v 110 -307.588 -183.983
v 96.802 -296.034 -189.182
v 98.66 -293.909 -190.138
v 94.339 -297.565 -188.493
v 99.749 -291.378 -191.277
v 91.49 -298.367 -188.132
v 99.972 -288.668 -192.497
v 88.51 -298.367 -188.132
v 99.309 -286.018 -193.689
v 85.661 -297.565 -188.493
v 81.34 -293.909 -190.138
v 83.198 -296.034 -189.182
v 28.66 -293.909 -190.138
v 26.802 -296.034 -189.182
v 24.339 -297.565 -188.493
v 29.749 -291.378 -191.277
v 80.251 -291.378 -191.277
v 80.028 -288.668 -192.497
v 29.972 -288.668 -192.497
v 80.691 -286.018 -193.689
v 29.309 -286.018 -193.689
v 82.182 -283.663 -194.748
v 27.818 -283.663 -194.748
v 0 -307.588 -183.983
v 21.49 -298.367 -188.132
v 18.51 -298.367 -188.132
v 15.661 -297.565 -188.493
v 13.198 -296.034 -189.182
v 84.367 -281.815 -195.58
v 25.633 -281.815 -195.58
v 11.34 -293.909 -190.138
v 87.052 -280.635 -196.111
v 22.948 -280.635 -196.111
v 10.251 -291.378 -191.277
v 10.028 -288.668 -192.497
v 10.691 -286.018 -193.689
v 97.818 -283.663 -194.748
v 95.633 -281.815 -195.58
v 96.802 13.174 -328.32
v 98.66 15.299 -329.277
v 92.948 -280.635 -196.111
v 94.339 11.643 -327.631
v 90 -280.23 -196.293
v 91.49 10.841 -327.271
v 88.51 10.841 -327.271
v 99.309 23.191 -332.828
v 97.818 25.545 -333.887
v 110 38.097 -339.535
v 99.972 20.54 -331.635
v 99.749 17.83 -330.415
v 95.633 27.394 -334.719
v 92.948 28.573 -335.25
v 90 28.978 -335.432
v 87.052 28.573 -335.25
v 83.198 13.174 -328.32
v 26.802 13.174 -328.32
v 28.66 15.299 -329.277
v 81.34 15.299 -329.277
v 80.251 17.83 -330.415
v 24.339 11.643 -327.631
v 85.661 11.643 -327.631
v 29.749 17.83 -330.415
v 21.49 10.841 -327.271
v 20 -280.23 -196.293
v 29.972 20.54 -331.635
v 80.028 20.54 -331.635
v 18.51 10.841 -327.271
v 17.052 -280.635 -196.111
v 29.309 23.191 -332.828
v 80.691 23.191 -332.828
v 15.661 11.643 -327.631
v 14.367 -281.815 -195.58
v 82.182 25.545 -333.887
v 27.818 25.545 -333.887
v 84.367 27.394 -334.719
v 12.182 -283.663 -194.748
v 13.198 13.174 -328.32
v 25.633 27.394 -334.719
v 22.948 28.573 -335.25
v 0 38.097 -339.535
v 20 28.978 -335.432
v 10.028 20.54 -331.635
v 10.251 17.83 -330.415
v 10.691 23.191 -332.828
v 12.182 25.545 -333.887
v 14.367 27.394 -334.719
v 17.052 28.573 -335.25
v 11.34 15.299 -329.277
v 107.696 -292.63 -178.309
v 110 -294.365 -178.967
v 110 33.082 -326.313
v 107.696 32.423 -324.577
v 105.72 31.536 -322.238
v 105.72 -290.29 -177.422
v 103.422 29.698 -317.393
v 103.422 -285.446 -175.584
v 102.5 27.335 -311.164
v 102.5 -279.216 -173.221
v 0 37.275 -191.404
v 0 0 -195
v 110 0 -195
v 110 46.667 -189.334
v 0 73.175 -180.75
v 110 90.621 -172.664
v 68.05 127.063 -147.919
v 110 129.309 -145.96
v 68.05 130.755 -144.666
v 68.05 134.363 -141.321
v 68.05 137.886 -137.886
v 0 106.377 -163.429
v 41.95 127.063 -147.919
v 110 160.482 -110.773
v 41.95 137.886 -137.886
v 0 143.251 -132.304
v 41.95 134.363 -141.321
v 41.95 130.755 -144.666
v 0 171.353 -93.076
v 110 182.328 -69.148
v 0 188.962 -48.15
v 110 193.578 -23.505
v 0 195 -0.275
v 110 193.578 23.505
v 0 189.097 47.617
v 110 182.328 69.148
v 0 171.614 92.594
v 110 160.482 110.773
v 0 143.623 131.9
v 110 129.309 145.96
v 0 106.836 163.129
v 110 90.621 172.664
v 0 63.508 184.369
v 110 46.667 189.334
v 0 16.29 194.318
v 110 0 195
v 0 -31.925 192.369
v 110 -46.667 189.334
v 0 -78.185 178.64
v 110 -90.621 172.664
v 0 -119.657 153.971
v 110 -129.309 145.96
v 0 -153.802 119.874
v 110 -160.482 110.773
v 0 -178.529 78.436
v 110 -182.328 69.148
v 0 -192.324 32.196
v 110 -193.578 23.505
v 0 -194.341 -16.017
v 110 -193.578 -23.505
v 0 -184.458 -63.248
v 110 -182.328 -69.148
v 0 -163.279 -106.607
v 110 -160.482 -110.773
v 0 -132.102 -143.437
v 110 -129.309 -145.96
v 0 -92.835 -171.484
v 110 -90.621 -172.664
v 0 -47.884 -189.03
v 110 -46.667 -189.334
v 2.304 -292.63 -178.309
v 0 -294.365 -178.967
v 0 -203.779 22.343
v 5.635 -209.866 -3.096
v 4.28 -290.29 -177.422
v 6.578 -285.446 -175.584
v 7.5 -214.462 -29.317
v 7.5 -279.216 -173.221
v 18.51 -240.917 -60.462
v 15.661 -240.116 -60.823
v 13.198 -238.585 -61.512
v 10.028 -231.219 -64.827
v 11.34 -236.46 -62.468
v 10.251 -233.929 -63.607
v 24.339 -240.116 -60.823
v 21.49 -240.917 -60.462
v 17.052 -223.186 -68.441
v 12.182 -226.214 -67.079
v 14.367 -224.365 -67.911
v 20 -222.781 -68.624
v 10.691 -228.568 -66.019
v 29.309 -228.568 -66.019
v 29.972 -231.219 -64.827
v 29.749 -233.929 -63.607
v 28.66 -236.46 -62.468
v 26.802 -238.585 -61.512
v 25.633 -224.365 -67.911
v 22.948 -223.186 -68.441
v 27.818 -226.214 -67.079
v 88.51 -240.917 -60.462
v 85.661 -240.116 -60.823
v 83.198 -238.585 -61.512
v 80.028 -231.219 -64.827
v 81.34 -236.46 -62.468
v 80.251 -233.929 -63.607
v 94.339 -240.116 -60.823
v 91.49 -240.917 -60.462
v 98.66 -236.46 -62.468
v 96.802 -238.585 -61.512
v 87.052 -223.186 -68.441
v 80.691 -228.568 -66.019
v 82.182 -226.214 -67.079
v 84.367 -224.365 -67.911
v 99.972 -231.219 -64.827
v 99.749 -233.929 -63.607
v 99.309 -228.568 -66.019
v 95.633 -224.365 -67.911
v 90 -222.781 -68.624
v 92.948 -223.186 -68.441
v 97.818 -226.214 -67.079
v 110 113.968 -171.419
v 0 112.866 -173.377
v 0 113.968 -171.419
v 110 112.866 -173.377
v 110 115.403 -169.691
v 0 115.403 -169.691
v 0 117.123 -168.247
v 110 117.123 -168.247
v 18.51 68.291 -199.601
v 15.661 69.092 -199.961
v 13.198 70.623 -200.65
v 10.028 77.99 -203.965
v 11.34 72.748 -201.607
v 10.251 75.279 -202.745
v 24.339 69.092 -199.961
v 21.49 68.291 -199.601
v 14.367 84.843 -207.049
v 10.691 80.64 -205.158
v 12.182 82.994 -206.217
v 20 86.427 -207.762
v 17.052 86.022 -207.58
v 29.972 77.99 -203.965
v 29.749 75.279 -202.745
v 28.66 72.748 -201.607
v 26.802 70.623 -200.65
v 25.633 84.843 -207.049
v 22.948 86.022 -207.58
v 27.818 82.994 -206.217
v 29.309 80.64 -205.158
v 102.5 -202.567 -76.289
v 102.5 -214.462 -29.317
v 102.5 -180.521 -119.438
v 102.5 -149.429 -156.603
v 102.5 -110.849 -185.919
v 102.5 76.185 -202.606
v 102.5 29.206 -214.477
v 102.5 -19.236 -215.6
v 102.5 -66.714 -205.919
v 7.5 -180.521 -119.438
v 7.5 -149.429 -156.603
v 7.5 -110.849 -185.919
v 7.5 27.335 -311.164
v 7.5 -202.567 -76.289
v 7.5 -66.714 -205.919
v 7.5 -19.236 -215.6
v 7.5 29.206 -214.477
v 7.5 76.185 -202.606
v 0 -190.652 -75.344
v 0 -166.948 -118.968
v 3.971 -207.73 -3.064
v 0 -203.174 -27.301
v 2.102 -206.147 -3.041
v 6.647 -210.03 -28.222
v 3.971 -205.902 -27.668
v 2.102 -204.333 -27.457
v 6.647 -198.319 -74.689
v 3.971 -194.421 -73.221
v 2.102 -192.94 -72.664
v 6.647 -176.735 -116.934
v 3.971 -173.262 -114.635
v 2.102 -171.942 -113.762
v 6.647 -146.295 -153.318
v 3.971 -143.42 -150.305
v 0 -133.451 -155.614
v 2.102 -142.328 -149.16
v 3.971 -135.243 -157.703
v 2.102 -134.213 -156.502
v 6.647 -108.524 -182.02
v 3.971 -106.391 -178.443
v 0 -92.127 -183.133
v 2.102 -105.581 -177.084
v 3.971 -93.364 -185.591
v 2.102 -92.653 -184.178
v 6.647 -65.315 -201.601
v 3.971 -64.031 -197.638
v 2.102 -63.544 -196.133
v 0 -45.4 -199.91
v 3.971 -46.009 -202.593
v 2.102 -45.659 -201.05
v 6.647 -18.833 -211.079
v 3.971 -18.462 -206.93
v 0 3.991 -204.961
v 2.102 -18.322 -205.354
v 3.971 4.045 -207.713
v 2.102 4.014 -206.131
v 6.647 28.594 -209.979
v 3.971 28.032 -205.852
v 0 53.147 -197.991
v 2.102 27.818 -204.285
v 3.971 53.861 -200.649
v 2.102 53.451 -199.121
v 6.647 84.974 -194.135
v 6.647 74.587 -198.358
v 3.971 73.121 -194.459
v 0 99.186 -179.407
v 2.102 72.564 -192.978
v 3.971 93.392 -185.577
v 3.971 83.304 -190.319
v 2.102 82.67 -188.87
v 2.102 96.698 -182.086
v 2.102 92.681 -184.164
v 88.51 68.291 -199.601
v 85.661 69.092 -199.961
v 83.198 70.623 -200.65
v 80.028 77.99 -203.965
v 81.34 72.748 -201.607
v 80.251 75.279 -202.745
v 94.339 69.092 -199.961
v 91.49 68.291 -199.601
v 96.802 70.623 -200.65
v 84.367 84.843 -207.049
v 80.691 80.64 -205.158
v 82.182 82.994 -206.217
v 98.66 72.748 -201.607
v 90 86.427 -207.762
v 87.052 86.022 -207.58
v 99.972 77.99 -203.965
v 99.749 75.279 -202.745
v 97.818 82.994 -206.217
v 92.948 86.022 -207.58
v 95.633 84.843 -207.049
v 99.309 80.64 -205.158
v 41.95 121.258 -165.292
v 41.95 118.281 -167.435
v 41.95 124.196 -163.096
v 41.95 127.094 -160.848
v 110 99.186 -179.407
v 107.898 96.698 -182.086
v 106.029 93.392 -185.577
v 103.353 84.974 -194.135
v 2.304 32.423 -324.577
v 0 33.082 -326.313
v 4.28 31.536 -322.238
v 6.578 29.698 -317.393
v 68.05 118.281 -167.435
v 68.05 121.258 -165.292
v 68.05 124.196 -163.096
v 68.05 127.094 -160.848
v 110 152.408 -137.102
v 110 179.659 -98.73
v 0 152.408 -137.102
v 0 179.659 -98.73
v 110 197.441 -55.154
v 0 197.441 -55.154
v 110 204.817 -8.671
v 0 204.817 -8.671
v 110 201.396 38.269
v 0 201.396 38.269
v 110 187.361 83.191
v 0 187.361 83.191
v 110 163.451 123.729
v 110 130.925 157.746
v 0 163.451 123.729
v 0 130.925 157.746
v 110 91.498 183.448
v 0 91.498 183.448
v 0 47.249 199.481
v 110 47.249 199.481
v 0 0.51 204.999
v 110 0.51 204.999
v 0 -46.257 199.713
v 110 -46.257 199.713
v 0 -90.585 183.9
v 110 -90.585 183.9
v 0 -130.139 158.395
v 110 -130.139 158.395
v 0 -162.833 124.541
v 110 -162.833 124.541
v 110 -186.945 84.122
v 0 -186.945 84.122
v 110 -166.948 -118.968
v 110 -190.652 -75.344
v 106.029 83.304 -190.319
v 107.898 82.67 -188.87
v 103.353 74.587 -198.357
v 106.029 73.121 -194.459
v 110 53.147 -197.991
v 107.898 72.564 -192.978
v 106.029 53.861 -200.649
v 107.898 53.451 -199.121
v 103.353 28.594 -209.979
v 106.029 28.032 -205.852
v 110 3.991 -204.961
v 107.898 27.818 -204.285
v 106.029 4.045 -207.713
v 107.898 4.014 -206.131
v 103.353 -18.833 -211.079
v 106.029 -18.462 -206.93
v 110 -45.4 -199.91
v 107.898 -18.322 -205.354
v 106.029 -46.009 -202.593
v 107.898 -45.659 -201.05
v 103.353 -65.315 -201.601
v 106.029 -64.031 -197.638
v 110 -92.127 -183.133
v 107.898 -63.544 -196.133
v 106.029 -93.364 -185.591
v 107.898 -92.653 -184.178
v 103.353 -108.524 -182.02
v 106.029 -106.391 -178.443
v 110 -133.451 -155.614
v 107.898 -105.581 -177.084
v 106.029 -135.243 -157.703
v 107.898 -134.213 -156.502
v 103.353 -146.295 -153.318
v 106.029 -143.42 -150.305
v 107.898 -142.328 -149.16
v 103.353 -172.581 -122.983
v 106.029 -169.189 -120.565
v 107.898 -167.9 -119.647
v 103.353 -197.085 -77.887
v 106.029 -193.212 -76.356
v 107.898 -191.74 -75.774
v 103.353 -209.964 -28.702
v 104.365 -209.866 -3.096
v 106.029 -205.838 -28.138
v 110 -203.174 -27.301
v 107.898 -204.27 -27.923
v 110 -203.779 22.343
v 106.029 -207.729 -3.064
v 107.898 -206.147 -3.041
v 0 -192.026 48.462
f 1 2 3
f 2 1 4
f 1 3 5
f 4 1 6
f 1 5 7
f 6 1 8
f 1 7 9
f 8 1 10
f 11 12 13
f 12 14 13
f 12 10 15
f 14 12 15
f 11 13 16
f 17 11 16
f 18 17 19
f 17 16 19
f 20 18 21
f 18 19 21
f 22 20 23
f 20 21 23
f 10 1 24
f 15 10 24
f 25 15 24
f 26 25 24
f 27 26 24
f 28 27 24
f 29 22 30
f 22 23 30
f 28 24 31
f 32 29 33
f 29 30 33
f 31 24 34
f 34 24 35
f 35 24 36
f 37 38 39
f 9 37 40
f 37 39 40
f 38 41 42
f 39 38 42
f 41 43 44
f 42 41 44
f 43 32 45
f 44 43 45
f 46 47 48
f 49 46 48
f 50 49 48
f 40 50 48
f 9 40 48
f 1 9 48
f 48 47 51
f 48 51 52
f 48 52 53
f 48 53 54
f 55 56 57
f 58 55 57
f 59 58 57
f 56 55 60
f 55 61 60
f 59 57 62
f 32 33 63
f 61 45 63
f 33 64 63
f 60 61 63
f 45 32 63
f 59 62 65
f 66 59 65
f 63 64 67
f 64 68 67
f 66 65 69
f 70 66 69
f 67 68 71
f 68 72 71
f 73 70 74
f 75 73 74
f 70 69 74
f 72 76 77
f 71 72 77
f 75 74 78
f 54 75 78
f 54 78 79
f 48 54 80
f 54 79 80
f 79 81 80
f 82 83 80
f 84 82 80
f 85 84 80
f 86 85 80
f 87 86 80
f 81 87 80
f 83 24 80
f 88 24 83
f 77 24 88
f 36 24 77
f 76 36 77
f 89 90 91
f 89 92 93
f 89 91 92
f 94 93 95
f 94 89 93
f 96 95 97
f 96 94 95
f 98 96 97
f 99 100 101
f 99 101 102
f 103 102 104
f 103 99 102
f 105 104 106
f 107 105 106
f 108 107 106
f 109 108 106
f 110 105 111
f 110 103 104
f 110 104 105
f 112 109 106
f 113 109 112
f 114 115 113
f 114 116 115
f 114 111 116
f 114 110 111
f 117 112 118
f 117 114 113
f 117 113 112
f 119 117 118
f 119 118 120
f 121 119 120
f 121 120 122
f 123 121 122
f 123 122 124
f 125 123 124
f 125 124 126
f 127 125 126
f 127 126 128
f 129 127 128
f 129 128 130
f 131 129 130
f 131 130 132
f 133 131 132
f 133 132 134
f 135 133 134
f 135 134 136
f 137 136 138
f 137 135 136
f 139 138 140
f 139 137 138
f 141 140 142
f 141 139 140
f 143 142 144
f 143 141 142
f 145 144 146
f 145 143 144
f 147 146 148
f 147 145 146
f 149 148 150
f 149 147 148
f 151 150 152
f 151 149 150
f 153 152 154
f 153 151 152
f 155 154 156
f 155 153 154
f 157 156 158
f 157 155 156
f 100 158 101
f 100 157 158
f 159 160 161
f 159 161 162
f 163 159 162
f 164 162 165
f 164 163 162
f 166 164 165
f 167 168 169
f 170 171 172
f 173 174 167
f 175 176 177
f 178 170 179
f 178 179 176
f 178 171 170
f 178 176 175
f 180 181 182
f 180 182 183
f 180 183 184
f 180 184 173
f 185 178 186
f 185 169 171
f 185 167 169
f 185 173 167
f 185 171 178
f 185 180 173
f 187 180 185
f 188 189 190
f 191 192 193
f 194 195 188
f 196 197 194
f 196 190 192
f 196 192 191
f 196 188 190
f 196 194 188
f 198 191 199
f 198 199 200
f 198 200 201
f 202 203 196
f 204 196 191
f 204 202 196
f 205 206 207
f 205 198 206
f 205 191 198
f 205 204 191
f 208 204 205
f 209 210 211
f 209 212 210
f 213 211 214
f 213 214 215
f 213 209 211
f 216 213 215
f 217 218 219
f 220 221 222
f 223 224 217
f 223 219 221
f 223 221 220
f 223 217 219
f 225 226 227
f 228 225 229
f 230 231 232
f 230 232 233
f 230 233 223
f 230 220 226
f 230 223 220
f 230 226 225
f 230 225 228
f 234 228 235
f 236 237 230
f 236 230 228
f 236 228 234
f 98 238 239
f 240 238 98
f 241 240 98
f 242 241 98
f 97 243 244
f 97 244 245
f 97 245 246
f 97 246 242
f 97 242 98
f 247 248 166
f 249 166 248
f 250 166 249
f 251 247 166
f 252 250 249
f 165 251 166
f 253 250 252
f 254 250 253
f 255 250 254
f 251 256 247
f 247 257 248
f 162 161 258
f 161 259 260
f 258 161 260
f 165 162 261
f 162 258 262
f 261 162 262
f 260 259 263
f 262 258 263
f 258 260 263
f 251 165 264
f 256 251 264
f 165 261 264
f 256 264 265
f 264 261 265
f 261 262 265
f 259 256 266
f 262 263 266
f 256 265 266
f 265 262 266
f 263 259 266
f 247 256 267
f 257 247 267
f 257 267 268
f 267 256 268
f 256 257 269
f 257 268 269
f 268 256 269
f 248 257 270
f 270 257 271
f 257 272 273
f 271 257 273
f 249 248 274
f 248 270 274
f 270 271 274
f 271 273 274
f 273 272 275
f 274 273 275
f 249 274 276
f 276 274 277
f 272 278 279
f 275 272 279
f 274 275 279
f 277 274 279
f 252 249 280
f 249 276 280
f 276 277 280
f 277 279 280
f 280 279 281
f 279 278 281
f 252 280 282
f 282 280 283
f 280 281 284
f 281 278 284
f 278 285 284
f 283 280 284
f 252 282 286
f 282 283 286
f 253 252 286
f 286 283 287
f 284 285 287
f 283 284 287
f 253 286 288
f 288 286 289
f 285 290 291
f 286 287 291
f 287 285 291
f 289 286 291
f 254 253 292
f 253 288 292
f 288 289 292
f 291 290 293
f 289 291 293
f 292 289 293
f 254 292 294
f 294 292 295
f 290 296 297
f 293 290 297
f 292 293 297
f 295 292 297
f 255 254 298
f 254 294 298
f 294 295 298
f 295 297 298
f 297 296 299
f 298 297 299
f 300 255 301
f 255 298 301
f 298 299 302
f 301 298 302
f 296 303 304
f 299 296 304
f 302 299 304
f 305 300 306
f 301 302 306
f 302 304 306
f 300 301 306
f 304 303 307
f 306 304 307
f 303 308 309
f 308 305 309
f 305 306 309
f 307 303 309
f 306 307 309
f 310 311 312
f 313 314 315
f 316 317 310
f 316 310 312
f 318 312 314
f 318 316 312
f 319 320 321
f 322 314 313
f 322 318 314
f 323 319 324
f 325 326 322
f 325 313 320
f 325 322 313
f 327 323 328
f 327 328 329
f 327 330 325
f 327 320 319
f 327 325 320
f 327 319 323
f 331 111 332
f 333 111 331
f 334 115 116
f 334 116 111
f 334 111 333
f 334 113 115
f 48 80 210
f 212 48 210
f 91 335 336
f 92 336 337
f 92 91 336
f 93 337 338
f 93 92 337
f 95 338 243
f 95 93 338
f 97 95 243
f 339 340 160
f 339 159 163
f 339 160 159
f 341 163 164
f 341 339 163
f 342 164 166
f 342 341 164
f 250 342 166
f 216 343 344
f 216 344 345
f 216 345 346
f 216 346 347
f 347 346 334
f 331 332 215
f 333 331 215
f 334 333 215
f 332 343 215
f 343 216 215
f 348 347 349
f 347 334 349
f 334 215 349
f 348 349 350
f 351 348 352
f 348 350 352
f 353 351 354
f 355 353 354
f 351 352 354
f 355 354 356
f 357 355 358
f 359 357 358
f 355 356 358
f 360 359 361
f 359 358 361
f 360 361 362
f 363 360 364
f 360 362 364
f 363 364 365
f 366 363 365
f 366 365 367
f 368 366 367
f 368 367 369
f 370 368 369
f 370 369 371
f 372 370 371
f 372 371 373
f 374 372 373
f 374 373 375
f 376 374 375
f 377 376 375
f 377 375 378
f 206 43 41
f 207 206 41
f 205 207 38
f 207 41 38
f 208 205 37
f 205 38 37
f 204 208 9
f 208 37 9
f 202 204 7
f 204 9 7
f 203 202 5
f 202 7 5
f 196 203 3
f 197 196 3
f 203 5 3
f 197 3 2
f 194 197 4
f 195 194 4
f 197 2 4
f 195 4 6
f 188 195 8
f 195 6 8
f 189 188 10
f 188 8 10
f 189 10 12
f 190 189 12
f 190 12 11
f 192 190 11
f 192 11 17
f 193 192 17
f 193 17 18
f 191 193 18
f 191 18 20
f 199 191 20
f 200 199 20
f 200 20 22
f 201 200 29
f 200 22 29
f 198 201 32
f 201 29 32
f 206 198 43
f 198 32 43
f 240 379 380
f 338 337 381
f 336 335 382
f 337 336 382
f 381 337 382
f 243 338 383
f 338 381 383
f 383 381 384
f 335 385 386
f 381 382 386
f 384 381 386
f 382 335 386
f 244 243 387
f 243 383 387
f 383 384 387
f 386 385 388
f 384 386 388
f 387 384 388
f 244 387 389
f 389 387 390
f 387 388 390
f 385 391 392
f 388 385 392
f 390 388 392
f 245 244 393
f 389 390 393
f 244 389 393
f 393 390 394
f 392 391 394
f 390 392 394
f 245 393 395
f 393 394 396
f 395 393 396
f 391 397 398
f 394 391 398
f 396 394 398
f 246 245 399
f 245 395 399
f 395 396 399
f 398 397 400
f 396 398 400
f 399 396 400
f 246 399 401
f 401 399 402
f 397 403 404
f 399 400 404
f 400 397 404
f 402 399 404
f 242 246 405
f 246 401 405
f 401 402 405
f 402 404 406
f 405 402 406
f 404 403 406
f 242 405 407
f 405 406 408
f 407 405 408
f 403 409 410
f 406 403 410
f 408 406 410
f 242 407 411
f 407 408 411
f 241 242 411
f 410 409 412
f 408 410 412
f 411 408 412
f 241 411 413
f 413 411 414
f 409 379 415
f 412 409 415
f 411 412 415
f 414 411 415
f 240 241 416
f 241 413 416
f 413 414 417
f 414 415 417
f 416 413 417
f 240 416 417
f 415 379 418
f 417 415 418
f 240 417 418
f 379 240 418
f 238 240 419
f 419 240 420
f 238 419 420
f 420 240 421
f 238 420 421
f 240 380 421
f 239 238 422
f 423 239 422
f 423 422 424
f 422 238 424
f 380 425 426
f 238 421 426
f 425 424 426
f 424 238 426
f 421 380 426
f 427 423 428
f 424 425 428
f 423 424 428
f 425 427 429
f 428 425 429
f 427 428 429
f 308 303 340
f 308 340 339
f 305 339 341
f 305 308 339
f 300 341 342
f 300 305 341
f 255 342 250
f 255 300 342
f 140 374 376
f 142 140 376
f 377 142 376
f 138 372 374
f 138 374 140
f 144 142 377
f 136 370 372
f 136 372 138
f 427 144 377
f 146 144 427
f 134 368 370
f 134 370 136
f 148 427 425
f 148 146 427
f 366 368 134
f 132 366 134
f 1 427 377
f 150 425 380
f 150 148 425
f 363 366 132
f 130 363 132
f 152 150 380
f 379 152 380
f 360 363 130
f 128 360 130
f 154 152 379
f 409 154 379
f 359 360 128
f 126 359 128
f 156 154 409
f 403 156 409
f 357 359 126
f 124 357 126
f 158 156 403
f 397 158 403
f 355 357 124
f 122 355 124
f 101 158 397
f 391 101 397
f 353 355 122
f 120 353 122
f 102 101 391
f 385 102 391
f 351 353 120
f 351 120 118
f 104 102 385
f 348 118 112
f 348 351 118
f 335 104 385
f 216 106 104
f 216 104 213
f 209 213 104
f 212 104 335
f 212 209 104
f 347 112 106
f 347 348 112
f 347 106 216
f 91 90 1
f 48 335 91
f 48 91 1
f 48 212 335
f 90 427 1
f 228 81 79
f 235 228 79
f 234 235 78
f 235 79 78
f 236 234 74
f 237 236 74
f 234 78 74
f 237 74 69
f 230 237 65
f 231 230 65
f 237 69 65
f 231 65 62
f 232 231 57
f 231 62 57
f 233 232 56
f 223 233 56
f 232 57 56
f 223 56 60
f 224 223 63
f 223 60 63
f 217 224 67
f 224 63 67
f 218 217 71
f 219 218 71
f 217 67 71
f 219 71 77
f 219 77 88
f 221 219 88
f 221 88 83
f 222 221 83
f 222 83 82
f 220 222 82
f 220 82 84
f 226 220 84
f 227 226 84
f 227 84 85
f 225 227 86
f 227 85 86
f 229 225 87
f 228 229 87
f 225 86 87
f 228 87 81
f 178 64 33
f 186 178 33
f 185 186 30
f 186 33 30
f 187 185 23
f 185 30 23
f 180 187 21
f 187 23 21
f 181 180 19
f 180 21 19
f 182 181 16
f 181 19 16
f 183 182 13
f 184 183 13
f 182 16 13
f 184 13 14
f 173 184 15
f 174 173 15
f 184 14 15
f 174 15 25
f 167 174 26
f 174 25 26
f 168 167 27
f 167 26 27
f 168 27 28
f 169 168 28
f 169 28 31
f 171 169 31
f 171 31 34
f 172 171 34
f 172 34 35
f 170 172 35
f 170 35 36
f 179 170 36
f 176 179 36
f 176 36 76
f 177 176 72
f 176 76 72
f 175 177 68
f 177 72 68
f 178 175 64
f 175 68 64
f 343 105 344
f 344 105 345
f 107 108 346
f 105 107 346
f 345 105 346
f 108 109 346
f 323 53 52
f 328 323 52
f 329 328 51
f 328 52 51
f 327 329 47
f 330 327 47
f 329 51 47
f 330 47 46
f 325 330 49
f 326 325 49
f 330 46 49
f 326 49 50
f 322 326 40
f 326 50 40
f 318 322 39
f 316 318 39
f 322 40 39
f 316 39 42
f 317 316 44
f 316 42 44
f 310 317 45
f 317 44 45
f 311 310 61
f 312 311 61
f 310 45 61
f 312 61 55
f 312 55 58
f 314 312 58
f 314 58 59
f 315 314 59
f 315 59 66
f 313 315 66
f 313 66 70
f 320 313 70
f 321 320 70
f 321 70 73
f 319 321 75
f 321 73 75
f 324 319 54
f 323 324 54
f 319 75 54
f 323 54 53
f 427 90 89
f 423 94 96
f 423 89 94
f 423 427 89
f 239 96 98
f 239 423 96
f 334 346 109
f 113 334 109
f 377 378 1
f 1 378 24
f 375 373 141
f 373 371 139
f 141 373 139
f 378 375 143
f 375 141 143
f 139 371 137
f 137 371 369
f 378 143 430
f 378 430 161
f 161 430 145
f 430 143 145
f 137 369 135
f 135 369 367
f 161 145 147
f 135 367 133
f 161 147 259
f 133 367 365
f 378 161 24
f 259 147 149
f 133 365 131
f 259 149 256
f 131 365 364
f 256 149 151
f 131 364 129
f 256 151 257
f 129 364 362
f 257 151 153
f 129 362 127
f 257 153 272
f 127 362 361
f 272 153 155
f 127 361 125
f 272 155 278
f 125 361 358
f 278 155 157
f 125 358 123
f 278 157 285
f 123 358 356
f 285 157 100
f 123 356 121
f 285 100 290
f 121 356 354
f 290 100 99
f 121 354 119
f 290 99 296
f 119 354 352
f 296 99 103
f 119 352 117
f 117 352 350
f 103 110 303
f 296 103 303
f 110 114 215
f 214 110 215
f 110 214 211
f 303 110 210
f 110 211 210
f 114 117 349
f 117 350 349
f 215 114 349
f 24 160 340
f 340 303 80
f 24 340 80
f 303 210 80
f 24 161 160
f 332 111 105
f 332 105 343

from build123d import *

# Parameters (mm, degrees)
SKETCH1_R           = 205
SKETCH1_R_2         = 195
BOSS_EXTRUDE1_DEPTH = 110
CUT_EXTRUDE1_START  = 41.95
CUT_EXTRUDE1_DEPTH  = 26.1
BOSS_EXTRUDE3_DEPTH = 110
SKETCH5_R           = 10
CUT_EXTRUDE2_DEPTH  = 140
FILLET1_R           = 12.5
CUT_EXTRUDE4_START  = -7.5
CUT_EXTRUDE4_DEPTH  = 7.5
CUT_EXTRUDE5_DEPTH  = 7.5
FILLET2_R           = 12.5


with BuildPart() as part:
    # Sketch1 → Boss-Extrude1 (new body)
    with BuildSketch(Plane(origin=(0, 0, 0), x_dir=(0, 0, -1), z_dir=(1, 0, 0))):
        Circle(SKETCH1_R)
        Circle(SKETCH1_R_2, mode=Mode.SUBTRACT)
    extrude(amount=BOSS_EXTRUDE1_DEPTH)

    # Sketch3 → Cut-Extrude1 (cut)
    with BuildSketch(Plane(origin=(0, 0, 0), x_dir=(0, 0, -1), z_dir=(1, 0, 0)).offset(CUT_EXTRUDE1_START)):
        with BuildLine():
            Line((160.8479694, 127.09418059), (137.885822331, 137.885822331))
            ThreePointArc((137.885822331, 137.885822331), (143.004745144, 132.569388874), (147.918824855, 127.063060145))
            Line((147.918824855, 127.063060145), (167.43543162, 118.280920855))
            ThreePointArc((167.43543162, 118.280920855), (164.200841146, 122.731755332), (160.8479694, 127.09418059))
        make_face()
    extrude(amount=CUT_EXTRUDE1_DEPTH, mode=Mode.SUBTRACT)

    # Sketch4 → Boss-Extrude3 (add)
    with BuildSketch(Plane.ZY):
        with BuildLine():
            Line((-339.535373084, 38.097443801), (-170.172659449, 114.307768661))
            ThreePointArc((-170.172659449, 114.307768661), (-156.650879802, -132.232756371), (84.122100255, -186.945104907))
            Line((84.122100255, -186.945104907), (-183.982931916, -307.587784512))
            Line((-183.982931916, -307.587784512), (-339.535373084, 38.097443801))
        make_face()
    extrude(amount=-BOSS_EXTRUDE3_DEPTH)

    # Sketch5 → Cut-Extrude2 (cut)
    with BuildSketch(Plane(origin=(0, -120.642679605, -268.105032171), x_dir=(-1, 0, 0), z_dir=(0, -0.41035170855993064, -0.9119273410102067))):
        with Locations(Location((-90, -185, 0), (0, 0, 90))):
            Circle(SKETCH5_R)
        with Locations(Location((-20, -185, 0), (0, 0, 90))):
            Circle(SKETCH5_R)
        with Locations(Location((-20, 154.071021086, 0), (0, 0, 90))):
            Circle(SKETCH5_R)
        with Locations(Location((-90, 154.071021086, 0), (0, 0, 90))):
            Circle(SKETCH5_R)
    extrude(amount=-CUT_EXTRUDE2_DEPTH, mode=Mode.SUBTRACT)

    # Fillet1
    fillet1_edges = [part.edges().sort_by_distance(p)[0] for p in [
        (55, 114.307768661, -170.172659449),
    ]]
    fillet(fillet1_edges, radius=FILLET1_R)

    # Sketch6 → Cut-Extrude4 (cut)
    with BuildSketch(Plane(origin=(110, 0, 0), x_dir=(0, 0, -1), z_dir=(1, 0, 0)).offset(CUT_EXTRUDE4_START)):
        with BuildLine():
            Line((326.312582588, 33.081687477), (179.407480032, 99.186471399))
            ThreePointArc((179.407480032, 99.186471399), (170.629059775, -113.625366712), (-22.343234006, -203.778752313))
            Line((-22.343234006, -203.778752313), (178.967175591, -294.364994017))
            Line((178.967175591, -294.364994017), (326.312582588, 33.081687477))
        make_face()
    extrude(amount=CUT_EXTRUDE4_DEPTH, mode=Mode.SUBTRACT)

    # Sketch7 → Cut-Extrude5 (cut)
    with BuildSketch(Plane.ZY):
        with BuildLine():
            Line((-179.407480032, 99.186471399), (-326.312582588, 33.081687477))
            Line((-326.312582588, 33.081687477), (-178.967175591, -294.364994017))
            Line((-178.967175591, -294.364994017), (22.343234006, -203.778752313))
            ThreePointArc((22.343234006, -203.778752313), (-170.629059775, -113.625366712), (-179.407480032, 99.186471399))
        make_face()
    extrude(amount=-CUT_EXTRUDE5_DEPTH, mode=Mode.SUBTRACT)

    # Fillet2
    # the kernel refuses this fillet: 12.5 mm, written as the material it adds along each edge
    with BuildSketch(Plane(origin=(102.5, -192.025828775, 48.461834434), x_dir=(1, 0, 0), z_dir=(0, -0.4103517085599303, -0.9119273410102069))) as fillet2_piece_1_section:
        with BuildLine():
            CenterArc((12.5, -11.456439237), FILLET2_R, 113.578178478, 66.421821522)
            Line((0, -11.456439237), (0, 0))
            Line((0, 0), (7.5, 0))
        make_face()
    fillet2_piece_1 = extrude(amount=249.39378369, mode=Mode.PRIVATE)
    fillet2_piece_1 = fillet2_piece_1 - Plane(origin=(104.520833168, 0, 0), x_dir=(0, 0.4838364458471492, -0.8751584391811569), z_dir=(-1, 0, 0)) * Cylinder(205, 545, mode=Mode.PRIVATE)
    add(fillet2_piece_1)
    with BuildSketch(Plane(origin=(102.5, 0, 0), x_dir=(0, 0.6010821181754732, -0.7991872666713895), z_dir=(0, 0.7991872666713895, 0.6010821181754732))) as fillet2_piece_2_section:
        with BuildLine():
            CenterArc((216.456439237, -12.5), FILLET2_R, 90, 66.421821522)
            Line((216.456439237, 0), (205, 0))
            Line((205, 0), (205, -7.5))
        make_face()
    fillet2_piece_2 = revolve(axis=Axis((102.5, 0, 0), (-1, 0, 0)), revolution_arc=141.215785086, mode=Mode.PRIVATE)
    fillet2_piece_2 = split(fillet2_piece_2, bisect_by=Plane(origin=(104.520833168, -262.670858667, -108.533087047), z_dir=(0, 0.9119273410102068, -0.41035170855993025)), keep=Keep.TOP, mode=Mode.PRIVATE)
    fillet2_piece_2 = split(fillet2_piece_2, bisect_by=Plane(origin=(104.520833168, 64.775822826, -255.878494044), z_dir=(0, -0.9119273410102069, 0.41035170855993014)), keep=Keep.TOP, mode=Mode.PRIVATE)
    add(fillet2_piece_2)
    with BuildSketch(Plane(origin=(102.5, 33.081687477, -326.312582588), x_dir=(1, 0, 0), z_dir=(0, 0.41035170855993014, 0.9119273410102069))) as fillet2_piece_3_section:
        with BuildLine():
            CenterArc((12.5, -11.456439237), FILLET2_R, 113.578178478, 66.421821522)
            Line((0, -11.456439237), (0, 0))
            Line((0, 0), (7.5, 0))
        make_face()
    fillet2_piece_3 = extrude(amount=189.734088675, mode=Mode.PRIVATE)
    fillet2_piece_3 = fillet2_piece_3 - Plane(origin=(104.520833168, 0, 0), x_dir=(0, 0.4838364458471492, -0.8751584391811569), z_dir=(-1, 0, 0)) * Cylinder(205, 426, mode=Mode.PRIVATE)
    add(fillet2_piece_3)
    with BuildSketch(Plane(origin=(102.5, -294.364994017, -178.967175591), x_dir=(1, 0, 0), z_dir=(0, 0.9119273410102068, -0.4103517085599305)), Plane(origin=(7.5, 33.081687477, -326.312582588), x_dir=(-1, 0, 0), z_dir=(0, -0.9119273410102068, 0.41035170855993064))) as fillet2_piece_4:
        with BuildLine():
            CenterArc((12.5, -11.456439237), FILLET2_R, 113.578178478, 66.421821522)
            Line((0, -11.456439237), (0, 0))
            Line((0, 0), (7.5, 0))
        make_face()
    extrude(amount=359.071021086)
    with BuildSketch(Plane(origin=(7.5, -294.364994017, -178.967175591), x_dir=(-1, 0, 0), z_dir=(0, 0.41035170855993075, 0.9119273410102067))) as fillet2_piece_5_section:
        with BuildLine():
            CenterArc((12.5, -11.456439237), FILLET2_R, 113.578178478, 66.421821522)
            Line((0, -11.456439237), (0, 0))
            Line((0, 0), (7.5, 0))
        make_face()
    fillet2_piece_5 = extrude(amount=249.39378369, mode=Mode.PRIVATE)
    fillet2_piece_5 = fillet2_piece_5 - Plane(origin=(5.479166832, 0, 0), x_dir=(0, 0, -1), z_dir=(-1, 0, 0)) * Cylinder(195, 545, mode=Mode.PRIVATE)
    add(fillet2_piece_5)
    with BuildSketch(Plane(origin=(7.5, 110.939394936, -153.288879604), x_dir=(-1, 0, 0), z_dir=(0, -0.4103517085599306, -0.9119273410102067))) as fillet2_piece_6_section:
        with BuildLine():
            CenterArc((12.5, -11.456439237), FILLET2_R, 113.578178478, 66.421821522)
            Line((0, -11.456439237), (0, 0))
            Line((0, 0), (7.5, 0))
        make_face()
    fillet2_piece_6 = extrude(amount=189.734088675, mode=Mode.PRIVATE)
    fillet2_piece_6 = fillet2_piece_6 - Plane(origin=(5.479166832, 0, 0), x_dir=(0, 0, -1), z_dir=(-1, 0, 0)) * Cylinder(195, 426, mode=Mode.PRIVATE)
    add(fillet2_piece_6)
    with BuildSketch(Plane(origin=(7.5, 0, 0), x_dir=(0, -0.9691520376470129, 0.24646364422495046), z_dir=(0, 0.24646364422495046, 0.9691520376470129))) as fillet2_piece_7_section:
        with BuildLine():
            CenterArc((216.456439237, -12.5), FILLET2_R, 90, 66.421821522)
            Line((216.456439237, 0), (205, 0))
            Line((205, 0), (205, -7.5))
        make_face()
    fillet2_piece_7 = revolve(axis=Axis((7.5, 0, 0), (1, 0, 0)), revolution_arc=141.215785086, mode=Mode.PRIVATE)
    fillet2_piece_7 = split(fillet2_piece_7, bisect_by=Plane(origin=(5.479166832, -262.670858667, -108.533087047), z_dir=(0, 0.9119273410102067, -0.41035170855993075)), keep=Keep.TOP, mode=Mode.PRIVATE)
    fillet2_piece_7 = split(fillet2_piece_7, bisect_by=Plane(origin=(5.479166832, 64.775822826, -255.878494044), z_dir=(0, -0.9119273410102067, 0.4103517085599306)), keep=Keep.TOP, mode=Mode.PRIVATE)
    add(fillet2_piece_7)


solid = part.part
